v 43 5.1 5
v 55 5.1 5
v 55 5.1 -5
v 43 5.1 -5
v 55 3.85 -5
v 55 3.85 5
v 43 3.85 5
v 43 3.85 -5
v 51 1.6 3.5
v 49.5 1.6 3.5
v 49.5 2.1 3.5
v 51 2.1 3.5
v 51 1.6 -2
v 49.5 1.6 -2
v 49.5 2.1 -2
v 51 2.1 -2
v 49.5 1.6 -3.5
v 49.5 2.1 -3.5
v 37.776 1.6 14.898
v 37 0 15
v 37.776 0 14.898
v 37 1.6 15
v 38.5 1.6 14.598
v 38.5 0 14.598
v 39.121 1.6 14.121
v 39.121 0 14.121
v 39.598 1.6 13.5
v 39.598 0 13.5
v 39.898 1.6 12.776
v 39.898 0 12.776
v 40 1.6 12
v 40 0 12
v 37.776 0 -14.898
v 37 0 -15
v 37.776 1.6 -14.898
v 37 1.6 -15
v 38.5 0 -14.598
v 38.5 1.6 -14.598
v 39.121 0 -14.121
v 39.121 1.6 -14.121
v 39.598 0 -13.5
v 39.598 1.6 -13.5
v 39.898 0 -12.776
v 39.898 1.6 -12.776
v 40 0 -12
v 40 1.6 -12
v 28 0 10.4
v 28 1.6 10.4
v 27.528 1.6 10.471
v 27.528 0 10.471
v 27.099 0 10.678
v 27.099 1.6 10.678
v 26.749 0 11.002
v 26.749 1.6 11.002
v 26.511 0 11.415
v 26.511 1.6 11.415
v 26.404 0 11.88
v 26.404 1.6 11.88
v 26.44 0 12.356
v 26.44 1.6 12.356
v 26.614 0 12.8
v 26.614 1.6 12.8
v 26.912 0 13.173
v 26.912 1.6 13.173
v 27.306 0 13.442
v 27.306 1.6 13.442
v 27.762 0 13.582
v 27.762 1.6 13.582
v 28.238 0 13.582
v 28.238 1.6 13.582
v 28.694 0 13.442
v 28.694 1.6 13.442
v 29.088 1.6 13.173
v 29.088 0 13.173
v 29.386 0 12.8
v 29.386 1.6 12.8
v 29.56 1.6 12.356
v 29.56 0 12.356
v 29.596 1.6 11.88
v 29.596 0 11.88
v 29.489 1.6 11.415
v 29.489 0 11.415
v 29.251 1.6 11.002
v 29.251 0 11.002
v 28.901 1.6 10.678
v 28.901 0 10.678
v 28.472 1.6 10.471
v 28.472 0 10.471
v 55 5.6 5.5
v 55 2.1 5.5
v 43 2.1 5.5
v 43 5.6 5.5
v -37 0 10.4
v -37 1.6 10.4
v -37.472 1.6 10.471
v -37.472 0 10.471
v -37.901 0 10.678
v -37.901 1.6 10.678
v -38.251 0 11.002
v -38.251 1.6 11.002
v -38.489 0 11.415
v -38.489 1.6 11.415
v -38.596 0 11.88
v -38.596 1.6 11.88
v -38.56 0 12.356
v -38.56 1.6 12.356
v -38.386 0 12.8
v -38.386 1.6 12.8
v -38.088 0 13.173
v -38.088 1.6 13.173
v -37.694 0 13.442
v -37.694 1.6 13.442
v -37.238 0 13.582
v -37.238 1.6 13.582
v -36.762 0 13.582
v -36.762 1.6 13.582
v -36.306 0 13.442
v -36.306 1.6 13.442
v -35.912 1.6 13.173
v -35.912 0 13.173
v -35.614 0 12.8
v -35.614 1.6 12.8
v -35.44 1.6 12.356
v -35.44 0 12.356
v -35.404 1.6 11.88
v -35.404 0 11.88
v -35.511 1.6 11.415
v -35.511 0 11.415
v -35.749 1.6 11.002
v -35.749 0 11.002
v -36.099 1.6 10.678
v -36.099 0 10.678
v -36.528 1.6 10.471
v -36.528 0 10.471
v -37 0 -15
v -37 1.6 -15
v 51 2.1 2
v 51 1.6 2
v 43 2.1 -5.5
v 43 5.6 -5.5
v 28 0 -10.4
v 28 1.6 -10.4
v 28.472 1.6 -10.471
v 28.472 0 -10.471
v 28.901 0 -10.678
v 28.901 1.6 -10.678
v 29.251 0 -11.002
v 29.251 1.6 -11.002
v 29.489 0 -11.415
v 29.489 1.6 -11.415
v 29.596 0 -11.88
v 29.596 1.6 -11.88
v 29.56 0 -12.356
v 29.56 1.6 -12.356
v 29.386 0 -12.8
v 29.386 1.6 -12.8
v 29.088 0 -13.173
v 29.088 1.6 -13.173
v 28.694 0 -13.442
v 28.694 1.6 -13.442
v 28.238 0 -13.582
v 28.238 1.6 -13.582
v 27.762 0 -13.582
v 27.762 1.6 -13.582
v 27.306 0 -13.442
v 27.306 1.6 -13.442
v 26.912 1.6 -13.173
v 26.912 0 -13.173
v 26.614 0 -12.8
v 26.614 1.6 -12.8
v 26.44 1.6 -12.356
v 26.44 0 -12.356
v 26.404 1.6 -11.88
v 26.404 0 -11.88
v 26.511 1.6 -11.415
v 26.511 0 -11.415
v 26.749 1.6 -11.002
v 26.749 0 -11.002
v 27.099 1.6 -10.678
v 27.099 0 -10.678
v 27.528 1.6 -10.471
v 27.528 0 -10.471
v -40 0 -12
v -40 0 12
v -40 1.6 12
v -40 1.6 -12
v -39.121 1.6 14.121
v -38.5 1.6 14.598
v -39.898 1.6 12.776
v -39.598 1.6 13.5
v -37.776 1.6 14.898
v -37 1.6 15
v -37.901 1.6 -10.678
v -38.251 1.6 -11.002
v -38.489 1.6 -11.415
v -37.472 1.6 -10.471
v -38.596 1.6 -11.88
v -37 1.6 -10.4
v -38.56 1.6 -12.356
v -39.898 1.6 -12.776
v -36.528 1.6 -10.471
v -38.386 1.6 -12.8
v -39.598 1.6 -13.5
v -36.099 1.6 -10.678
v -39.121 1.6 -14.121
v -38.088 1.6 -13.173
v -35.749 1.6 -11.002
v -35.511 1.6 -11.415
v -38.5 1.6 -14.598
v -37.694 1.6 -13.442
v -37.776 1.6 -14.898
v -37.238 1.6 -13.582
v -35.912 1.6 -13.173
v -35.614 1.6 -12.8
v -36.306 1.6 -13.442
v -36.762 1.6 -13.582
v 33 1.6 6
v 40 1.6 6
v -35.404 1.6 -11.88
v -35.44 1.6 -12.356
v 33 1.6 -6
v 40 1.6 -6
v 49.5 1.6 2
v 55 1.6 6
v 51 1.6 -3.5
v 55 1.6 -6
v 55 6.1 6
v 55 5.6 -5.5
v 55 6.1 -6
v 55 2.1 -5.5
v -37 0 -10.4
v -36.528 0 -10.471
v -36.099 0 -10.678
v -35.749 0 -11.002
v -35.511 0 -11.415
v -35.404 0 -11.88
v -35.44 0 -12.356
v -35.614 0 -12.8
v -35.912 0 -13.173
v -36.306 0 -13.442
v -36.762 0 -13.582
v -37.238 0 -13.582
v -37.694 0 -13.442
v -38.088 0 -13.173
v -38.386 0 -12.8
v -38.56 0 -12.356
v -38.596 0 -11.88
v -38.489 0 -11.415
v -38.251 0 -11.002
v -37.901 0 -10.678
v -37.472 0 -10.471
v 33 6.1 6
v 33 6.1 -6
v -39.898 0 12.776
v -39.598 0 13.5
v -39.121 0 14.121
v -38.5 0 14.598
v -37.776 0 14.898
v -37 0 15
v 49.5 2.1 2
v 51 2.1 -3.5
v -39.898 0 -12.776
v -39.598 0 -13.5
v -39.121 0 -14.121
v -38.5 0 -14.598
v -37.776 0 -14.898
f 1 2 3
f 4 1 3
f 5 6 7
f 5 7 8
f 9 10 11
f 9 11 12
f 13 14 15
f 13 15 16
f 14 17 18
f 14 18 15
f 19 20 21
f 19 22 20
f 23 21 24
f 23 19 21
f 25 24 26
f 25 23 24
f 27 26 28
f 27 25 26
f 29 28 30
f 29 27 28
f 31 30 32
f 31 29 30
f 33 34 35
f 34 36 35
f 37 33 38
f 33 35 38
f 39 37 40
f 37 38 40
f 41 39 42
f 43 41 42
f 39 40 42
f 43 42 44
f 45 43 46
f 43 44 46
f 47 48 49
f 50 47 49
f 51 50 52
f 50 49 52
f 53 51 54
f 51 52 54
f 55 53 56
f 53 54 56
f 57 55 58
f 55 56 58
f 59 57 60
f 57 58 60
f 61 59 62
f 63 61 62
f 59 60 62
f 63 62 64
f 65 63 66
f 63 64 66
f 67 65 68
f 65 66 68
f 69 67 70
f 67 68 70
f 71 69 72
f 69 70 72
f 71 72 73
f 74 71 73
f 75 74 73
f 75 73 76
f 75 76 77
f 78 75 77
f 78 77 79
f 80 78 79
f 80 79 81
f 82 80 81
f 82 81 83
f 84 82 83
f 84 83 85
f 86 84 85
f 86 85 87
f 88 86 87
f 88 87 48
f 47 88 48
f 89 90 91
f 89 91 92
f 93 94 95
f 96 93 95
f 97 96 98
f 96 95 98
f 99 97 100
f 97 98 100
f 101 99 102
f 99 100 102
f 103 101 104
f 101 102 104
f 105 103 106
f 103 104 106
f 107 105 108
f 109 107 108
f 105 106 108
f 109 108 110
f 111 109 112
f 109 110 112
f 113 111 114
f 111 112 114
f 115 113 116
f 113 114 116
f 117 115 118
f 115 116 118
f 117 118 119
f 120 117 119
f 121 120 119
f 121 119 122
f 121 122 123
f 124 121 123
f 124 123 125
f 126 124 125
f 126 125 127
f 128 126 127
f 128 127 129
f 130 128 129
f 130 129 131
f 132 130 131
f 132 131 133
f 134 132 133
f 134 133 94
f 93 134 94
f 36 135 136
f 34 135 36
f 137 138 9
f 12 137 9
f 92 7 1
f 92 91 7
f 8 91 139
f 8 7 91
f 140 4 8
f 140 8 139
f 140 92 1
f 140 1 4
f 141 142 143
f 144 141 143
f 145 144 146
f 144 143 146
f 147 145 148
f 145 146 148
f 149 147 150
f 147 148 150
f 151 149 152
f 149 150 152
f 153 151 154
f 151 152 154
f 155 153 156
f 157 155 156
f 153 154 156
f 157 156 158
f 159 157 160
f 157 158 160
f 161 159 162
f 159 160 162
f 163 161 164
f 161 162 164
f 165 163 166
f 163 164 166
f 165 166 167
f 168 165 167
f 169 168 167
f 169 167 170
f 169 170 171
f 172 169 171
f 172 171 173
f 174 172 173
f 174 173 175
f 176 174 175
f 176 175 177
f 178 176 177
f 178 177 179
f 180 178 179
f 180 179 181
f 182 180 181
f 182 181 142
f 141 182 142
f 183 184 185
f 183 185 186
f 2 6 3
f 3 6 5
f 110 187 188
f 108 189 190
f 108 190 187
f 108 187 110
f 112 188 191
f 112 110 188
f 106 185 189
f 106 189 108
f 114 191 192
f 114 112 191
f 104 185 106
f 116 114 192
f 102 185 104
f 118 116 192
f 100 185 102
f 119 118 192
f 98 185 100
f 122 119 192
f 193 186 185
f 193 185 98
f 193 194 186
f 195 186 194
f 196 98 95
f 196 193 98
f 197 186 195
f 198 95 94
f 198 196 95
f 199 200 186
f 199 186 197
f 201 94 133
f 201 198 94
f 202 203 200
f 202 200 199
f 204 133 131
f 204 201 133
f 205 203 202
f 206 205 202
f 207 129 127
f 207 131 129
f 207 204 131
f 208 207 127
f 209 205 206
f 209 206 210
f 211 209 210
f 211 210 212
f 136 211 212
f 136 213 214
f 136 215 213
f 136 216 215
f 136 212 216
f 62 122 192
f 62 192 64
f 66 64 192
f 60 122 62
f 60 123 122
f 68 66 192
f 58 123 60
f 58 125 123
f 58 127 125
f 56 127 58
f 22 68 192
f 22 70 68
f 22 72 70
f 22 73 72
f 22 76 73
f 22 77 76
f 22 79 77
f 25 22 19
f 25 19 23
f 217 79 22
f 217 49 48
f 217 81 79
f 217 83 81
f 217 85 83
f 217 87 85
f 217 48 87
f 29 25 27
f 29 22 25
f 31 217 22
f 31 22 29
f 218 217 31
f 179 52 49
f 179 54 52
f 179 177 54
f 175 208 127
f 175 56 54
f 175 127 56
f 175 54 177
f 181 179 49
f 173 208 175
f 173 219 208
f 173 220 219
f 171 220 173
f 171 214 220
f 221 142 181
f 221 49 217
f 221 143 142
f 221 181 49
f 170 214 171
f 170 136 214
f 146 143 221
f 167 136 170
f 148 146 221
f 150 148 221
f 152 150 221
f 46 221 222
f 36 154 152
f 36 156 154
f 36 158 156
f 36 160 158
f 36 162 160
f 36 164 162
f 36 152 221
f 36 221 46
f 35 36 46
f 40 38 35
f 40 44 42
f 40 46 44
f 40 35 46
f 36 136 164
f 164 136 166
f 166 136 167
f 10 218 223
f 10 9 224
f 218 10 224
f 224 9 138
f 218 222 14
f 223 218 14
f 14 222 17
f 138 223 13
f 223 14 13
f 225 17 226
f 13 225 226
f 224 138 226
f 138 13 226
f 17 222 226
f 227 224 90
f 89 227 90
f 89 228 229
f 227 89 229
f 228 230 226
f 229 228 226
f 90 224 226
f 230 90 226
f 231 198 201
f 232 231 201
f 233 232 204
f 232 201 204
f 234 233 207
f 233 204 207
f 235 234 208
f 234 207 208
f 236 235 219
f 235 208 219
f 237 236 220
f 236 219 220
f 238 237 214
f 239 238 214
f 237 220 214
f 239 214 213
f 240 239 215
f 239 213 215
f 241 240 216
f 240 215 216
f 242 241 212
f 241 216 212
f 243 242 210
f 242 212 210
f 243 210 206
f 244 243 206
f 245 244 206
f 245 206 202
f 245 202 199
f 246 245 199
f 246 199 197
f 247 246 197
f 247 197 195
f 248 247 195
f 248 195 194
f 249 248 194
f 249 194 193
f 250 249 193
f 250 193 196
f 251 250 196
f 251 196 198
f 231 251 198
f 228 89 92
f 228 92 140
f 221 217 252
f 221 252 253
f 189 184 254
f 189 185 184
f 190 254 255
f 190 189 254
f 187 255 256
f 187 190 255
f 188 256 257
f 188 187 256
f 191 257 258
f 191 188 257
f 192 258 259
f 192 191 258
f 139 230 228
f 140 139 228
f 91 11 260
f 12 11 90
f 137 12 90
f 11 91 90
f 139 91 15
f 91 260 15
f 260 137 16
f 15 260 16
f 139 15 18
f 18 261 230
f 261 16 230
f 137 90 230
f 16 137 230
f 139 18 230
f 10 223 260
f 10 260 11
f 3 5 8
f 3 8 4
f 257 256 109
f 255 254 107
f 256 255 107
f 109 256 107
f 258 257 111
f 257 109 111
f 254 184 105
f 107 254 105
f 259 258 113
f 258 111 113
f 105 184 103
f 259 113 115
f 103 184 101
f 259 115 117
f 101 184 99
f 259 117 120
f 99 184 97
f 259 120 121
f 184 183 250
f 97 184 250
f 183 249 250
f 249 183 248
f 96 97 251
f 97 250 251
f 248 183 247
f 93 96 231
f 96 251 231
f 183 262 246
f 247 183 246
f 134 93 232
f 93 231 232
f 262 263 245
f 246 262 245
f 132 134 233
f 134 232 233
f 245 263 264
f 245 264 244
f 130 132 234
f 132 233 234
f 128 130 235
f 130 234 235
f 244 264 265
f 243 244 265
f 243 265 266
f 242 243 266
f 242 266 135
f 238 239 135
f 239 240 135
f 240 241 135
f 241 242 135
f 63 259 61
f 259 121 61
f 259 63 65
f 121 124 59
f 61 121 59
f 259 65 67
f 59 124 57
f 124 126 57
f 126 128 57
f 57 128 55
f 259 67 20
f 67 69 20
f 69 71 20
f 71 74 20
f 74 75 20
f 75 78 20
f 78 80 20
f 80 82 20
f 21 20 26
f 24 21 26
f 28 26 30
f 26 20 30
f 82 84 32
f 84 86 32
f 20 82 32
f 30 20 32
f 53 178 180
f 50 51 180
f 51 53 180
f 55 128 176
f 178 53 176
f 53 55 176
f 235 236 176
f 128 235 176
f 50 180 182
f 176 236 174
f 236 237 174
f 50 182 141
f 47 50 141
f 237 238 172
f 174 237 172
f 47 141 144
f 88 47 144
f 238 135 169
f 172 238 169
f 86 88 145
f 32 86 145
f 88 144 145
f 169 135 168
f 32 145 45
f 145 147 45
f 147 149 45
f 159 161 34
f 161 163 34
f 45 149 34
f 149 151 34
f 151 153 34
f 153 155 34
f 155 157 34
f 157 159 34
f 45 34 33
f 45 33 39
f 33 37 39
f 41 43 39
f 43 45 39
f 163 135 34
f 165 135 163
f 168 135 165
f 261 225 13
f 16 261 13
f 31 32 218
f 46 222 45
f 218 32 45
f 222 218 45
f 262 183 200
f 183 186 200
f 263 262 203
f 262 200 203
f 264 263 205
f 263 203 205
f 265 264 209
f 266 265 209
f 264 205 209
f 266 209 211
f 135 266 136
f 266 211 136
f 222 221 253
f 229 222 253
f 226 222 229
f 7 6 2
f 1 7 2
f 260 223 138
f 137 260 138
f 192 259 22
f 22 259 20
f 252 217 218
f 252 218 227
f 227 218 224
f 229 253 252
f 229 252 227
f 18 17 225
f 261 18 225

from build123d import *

# Parameters (mm, degrees)
PCB_OUTLINE_W                  = 80
PCB_OUTLINE_H                  = 30
PCB_BASE_DEPTH                 = 1.6
SKETCH3_W                      = 22
SKETCH3_H                      = 12
USB_CONNECTTOR_DUMMY_DEPTH     = 4.5
HOLE_LOCATIONS_R               = 1.6
MOUNTING_HOLES_DEPTH           = 58.18609971
SKETCH4_W                      = 11
SKETCH4_H                      = 3.5
SKETCH4_W_2                    = 10
SKETCH4_H_2                    = 1.25
USB_CONNECTOR_DUMMY_HOLE_DEPTH = 12
FILLET1_R                      = 3
SKETCH5_W                      = 1.5
SKETCH5_H                      = 1.5
CUT_EXTRUDE1_DEPTH             = 0.5


with BuildPart() as part:
    # PCB_Outline → PCB_Base (new body)
    with BuildSketch(Plane(origin=(0, 0, 0), x_dir=(1, 0, 0), z_dir=(0, 1, 0))):
        Rectangle(PCB_OUTLINE_W, PCB_OUTLINE_H)
    extrude(amount=PCB_BASE_DEPTH)

    # Sketch3 → USB_Connecttor_Dummy (add)
    with BuildSketch(Plane(origin=(0, 1.6, 0), x_dir=(1, 0, 0), z_dir=(0, 1, 0))):
        with Locations((44, 0)):
            Rectangle(SKETCH3_W, SKETCH3_H)
    extrude(amount=USB_CONNECTTOR_DUMMY_DEPTH)

    # Hole_Locations → Mounting_Holes (cut, through all)
    with BuildSketch(Plane(origin=(0, 1.6, 0), x_dir=(1, 0, 0), z_dir=(0, 1, 0))):
        with Locations(Location((-37, 12, 0), (0, 0, 270))):
            Circle(HOLE_LOCATIONS_R)
        with Locations(Location((28, 12, 0), (0, 0, 270))):
            Circle(HOLE_LOCATIONS_R)
        with Locations(Location((-37, -12, 0), (0, 0, 90))):
            Circle(HOLE_LOCATIONS_R)
        with Locations(Location((28, -12, 0), (0, 0, 90))):
            Circle(HOLE_LOCATIONS_R)
    extrude(amount=-MOUNTING_HOLES_DEPTH, mode=Mode.SUBTRACT)

    # Sketch4 → USB_Connector_Dummy_Hole (cut)
    with BuildSketch(Plane(origin=(55, 0, 0), x_dir=(0, 0, -1), z_dir=(1, 0, 0))):
        with Locations((0, 3.85)):
            Rectangle(SKETCH4_W, SKETCH4_H)
        with Locations((0, 4.475)):
            Rectangle(SKETCH4_W_2, SKETCH4_H_2, mode=Mode.SUBTRACT)
    extrude(amount=-USB_CONNECTOR_DUMMY_HOLE_DEPTH, mode=Mode.SUBTRACT)

    # Fillet1
    fillet1_edges = [part.edges().sort_by_distance(p)[0] for p in [
        (40, 0.8, 15),
        (-40, 0.8, 15),
        (-40, 0.8, -15),
        (40, 0.8, -15),
    ]]
    fillet(fillet1_edges, radius=FILLET1_R)

    # Sketch5 → Cut-Extrude1 (cut)
    with BuildSketch(Plane.XZ.offset(-1.6)):
        with Locations((50.25, -2.75)):
            Rectangle(SKETCH5_W, SKETCH5_H)
        with Locations((50.25, 2.75)):
            Rectangle(SKETCH5_W, SKETCH5_H)
    extrude(amount=-CUT_EXTRUDE1_DEPTH, mode=Mode.SUBTRACT)


solid = part.part
